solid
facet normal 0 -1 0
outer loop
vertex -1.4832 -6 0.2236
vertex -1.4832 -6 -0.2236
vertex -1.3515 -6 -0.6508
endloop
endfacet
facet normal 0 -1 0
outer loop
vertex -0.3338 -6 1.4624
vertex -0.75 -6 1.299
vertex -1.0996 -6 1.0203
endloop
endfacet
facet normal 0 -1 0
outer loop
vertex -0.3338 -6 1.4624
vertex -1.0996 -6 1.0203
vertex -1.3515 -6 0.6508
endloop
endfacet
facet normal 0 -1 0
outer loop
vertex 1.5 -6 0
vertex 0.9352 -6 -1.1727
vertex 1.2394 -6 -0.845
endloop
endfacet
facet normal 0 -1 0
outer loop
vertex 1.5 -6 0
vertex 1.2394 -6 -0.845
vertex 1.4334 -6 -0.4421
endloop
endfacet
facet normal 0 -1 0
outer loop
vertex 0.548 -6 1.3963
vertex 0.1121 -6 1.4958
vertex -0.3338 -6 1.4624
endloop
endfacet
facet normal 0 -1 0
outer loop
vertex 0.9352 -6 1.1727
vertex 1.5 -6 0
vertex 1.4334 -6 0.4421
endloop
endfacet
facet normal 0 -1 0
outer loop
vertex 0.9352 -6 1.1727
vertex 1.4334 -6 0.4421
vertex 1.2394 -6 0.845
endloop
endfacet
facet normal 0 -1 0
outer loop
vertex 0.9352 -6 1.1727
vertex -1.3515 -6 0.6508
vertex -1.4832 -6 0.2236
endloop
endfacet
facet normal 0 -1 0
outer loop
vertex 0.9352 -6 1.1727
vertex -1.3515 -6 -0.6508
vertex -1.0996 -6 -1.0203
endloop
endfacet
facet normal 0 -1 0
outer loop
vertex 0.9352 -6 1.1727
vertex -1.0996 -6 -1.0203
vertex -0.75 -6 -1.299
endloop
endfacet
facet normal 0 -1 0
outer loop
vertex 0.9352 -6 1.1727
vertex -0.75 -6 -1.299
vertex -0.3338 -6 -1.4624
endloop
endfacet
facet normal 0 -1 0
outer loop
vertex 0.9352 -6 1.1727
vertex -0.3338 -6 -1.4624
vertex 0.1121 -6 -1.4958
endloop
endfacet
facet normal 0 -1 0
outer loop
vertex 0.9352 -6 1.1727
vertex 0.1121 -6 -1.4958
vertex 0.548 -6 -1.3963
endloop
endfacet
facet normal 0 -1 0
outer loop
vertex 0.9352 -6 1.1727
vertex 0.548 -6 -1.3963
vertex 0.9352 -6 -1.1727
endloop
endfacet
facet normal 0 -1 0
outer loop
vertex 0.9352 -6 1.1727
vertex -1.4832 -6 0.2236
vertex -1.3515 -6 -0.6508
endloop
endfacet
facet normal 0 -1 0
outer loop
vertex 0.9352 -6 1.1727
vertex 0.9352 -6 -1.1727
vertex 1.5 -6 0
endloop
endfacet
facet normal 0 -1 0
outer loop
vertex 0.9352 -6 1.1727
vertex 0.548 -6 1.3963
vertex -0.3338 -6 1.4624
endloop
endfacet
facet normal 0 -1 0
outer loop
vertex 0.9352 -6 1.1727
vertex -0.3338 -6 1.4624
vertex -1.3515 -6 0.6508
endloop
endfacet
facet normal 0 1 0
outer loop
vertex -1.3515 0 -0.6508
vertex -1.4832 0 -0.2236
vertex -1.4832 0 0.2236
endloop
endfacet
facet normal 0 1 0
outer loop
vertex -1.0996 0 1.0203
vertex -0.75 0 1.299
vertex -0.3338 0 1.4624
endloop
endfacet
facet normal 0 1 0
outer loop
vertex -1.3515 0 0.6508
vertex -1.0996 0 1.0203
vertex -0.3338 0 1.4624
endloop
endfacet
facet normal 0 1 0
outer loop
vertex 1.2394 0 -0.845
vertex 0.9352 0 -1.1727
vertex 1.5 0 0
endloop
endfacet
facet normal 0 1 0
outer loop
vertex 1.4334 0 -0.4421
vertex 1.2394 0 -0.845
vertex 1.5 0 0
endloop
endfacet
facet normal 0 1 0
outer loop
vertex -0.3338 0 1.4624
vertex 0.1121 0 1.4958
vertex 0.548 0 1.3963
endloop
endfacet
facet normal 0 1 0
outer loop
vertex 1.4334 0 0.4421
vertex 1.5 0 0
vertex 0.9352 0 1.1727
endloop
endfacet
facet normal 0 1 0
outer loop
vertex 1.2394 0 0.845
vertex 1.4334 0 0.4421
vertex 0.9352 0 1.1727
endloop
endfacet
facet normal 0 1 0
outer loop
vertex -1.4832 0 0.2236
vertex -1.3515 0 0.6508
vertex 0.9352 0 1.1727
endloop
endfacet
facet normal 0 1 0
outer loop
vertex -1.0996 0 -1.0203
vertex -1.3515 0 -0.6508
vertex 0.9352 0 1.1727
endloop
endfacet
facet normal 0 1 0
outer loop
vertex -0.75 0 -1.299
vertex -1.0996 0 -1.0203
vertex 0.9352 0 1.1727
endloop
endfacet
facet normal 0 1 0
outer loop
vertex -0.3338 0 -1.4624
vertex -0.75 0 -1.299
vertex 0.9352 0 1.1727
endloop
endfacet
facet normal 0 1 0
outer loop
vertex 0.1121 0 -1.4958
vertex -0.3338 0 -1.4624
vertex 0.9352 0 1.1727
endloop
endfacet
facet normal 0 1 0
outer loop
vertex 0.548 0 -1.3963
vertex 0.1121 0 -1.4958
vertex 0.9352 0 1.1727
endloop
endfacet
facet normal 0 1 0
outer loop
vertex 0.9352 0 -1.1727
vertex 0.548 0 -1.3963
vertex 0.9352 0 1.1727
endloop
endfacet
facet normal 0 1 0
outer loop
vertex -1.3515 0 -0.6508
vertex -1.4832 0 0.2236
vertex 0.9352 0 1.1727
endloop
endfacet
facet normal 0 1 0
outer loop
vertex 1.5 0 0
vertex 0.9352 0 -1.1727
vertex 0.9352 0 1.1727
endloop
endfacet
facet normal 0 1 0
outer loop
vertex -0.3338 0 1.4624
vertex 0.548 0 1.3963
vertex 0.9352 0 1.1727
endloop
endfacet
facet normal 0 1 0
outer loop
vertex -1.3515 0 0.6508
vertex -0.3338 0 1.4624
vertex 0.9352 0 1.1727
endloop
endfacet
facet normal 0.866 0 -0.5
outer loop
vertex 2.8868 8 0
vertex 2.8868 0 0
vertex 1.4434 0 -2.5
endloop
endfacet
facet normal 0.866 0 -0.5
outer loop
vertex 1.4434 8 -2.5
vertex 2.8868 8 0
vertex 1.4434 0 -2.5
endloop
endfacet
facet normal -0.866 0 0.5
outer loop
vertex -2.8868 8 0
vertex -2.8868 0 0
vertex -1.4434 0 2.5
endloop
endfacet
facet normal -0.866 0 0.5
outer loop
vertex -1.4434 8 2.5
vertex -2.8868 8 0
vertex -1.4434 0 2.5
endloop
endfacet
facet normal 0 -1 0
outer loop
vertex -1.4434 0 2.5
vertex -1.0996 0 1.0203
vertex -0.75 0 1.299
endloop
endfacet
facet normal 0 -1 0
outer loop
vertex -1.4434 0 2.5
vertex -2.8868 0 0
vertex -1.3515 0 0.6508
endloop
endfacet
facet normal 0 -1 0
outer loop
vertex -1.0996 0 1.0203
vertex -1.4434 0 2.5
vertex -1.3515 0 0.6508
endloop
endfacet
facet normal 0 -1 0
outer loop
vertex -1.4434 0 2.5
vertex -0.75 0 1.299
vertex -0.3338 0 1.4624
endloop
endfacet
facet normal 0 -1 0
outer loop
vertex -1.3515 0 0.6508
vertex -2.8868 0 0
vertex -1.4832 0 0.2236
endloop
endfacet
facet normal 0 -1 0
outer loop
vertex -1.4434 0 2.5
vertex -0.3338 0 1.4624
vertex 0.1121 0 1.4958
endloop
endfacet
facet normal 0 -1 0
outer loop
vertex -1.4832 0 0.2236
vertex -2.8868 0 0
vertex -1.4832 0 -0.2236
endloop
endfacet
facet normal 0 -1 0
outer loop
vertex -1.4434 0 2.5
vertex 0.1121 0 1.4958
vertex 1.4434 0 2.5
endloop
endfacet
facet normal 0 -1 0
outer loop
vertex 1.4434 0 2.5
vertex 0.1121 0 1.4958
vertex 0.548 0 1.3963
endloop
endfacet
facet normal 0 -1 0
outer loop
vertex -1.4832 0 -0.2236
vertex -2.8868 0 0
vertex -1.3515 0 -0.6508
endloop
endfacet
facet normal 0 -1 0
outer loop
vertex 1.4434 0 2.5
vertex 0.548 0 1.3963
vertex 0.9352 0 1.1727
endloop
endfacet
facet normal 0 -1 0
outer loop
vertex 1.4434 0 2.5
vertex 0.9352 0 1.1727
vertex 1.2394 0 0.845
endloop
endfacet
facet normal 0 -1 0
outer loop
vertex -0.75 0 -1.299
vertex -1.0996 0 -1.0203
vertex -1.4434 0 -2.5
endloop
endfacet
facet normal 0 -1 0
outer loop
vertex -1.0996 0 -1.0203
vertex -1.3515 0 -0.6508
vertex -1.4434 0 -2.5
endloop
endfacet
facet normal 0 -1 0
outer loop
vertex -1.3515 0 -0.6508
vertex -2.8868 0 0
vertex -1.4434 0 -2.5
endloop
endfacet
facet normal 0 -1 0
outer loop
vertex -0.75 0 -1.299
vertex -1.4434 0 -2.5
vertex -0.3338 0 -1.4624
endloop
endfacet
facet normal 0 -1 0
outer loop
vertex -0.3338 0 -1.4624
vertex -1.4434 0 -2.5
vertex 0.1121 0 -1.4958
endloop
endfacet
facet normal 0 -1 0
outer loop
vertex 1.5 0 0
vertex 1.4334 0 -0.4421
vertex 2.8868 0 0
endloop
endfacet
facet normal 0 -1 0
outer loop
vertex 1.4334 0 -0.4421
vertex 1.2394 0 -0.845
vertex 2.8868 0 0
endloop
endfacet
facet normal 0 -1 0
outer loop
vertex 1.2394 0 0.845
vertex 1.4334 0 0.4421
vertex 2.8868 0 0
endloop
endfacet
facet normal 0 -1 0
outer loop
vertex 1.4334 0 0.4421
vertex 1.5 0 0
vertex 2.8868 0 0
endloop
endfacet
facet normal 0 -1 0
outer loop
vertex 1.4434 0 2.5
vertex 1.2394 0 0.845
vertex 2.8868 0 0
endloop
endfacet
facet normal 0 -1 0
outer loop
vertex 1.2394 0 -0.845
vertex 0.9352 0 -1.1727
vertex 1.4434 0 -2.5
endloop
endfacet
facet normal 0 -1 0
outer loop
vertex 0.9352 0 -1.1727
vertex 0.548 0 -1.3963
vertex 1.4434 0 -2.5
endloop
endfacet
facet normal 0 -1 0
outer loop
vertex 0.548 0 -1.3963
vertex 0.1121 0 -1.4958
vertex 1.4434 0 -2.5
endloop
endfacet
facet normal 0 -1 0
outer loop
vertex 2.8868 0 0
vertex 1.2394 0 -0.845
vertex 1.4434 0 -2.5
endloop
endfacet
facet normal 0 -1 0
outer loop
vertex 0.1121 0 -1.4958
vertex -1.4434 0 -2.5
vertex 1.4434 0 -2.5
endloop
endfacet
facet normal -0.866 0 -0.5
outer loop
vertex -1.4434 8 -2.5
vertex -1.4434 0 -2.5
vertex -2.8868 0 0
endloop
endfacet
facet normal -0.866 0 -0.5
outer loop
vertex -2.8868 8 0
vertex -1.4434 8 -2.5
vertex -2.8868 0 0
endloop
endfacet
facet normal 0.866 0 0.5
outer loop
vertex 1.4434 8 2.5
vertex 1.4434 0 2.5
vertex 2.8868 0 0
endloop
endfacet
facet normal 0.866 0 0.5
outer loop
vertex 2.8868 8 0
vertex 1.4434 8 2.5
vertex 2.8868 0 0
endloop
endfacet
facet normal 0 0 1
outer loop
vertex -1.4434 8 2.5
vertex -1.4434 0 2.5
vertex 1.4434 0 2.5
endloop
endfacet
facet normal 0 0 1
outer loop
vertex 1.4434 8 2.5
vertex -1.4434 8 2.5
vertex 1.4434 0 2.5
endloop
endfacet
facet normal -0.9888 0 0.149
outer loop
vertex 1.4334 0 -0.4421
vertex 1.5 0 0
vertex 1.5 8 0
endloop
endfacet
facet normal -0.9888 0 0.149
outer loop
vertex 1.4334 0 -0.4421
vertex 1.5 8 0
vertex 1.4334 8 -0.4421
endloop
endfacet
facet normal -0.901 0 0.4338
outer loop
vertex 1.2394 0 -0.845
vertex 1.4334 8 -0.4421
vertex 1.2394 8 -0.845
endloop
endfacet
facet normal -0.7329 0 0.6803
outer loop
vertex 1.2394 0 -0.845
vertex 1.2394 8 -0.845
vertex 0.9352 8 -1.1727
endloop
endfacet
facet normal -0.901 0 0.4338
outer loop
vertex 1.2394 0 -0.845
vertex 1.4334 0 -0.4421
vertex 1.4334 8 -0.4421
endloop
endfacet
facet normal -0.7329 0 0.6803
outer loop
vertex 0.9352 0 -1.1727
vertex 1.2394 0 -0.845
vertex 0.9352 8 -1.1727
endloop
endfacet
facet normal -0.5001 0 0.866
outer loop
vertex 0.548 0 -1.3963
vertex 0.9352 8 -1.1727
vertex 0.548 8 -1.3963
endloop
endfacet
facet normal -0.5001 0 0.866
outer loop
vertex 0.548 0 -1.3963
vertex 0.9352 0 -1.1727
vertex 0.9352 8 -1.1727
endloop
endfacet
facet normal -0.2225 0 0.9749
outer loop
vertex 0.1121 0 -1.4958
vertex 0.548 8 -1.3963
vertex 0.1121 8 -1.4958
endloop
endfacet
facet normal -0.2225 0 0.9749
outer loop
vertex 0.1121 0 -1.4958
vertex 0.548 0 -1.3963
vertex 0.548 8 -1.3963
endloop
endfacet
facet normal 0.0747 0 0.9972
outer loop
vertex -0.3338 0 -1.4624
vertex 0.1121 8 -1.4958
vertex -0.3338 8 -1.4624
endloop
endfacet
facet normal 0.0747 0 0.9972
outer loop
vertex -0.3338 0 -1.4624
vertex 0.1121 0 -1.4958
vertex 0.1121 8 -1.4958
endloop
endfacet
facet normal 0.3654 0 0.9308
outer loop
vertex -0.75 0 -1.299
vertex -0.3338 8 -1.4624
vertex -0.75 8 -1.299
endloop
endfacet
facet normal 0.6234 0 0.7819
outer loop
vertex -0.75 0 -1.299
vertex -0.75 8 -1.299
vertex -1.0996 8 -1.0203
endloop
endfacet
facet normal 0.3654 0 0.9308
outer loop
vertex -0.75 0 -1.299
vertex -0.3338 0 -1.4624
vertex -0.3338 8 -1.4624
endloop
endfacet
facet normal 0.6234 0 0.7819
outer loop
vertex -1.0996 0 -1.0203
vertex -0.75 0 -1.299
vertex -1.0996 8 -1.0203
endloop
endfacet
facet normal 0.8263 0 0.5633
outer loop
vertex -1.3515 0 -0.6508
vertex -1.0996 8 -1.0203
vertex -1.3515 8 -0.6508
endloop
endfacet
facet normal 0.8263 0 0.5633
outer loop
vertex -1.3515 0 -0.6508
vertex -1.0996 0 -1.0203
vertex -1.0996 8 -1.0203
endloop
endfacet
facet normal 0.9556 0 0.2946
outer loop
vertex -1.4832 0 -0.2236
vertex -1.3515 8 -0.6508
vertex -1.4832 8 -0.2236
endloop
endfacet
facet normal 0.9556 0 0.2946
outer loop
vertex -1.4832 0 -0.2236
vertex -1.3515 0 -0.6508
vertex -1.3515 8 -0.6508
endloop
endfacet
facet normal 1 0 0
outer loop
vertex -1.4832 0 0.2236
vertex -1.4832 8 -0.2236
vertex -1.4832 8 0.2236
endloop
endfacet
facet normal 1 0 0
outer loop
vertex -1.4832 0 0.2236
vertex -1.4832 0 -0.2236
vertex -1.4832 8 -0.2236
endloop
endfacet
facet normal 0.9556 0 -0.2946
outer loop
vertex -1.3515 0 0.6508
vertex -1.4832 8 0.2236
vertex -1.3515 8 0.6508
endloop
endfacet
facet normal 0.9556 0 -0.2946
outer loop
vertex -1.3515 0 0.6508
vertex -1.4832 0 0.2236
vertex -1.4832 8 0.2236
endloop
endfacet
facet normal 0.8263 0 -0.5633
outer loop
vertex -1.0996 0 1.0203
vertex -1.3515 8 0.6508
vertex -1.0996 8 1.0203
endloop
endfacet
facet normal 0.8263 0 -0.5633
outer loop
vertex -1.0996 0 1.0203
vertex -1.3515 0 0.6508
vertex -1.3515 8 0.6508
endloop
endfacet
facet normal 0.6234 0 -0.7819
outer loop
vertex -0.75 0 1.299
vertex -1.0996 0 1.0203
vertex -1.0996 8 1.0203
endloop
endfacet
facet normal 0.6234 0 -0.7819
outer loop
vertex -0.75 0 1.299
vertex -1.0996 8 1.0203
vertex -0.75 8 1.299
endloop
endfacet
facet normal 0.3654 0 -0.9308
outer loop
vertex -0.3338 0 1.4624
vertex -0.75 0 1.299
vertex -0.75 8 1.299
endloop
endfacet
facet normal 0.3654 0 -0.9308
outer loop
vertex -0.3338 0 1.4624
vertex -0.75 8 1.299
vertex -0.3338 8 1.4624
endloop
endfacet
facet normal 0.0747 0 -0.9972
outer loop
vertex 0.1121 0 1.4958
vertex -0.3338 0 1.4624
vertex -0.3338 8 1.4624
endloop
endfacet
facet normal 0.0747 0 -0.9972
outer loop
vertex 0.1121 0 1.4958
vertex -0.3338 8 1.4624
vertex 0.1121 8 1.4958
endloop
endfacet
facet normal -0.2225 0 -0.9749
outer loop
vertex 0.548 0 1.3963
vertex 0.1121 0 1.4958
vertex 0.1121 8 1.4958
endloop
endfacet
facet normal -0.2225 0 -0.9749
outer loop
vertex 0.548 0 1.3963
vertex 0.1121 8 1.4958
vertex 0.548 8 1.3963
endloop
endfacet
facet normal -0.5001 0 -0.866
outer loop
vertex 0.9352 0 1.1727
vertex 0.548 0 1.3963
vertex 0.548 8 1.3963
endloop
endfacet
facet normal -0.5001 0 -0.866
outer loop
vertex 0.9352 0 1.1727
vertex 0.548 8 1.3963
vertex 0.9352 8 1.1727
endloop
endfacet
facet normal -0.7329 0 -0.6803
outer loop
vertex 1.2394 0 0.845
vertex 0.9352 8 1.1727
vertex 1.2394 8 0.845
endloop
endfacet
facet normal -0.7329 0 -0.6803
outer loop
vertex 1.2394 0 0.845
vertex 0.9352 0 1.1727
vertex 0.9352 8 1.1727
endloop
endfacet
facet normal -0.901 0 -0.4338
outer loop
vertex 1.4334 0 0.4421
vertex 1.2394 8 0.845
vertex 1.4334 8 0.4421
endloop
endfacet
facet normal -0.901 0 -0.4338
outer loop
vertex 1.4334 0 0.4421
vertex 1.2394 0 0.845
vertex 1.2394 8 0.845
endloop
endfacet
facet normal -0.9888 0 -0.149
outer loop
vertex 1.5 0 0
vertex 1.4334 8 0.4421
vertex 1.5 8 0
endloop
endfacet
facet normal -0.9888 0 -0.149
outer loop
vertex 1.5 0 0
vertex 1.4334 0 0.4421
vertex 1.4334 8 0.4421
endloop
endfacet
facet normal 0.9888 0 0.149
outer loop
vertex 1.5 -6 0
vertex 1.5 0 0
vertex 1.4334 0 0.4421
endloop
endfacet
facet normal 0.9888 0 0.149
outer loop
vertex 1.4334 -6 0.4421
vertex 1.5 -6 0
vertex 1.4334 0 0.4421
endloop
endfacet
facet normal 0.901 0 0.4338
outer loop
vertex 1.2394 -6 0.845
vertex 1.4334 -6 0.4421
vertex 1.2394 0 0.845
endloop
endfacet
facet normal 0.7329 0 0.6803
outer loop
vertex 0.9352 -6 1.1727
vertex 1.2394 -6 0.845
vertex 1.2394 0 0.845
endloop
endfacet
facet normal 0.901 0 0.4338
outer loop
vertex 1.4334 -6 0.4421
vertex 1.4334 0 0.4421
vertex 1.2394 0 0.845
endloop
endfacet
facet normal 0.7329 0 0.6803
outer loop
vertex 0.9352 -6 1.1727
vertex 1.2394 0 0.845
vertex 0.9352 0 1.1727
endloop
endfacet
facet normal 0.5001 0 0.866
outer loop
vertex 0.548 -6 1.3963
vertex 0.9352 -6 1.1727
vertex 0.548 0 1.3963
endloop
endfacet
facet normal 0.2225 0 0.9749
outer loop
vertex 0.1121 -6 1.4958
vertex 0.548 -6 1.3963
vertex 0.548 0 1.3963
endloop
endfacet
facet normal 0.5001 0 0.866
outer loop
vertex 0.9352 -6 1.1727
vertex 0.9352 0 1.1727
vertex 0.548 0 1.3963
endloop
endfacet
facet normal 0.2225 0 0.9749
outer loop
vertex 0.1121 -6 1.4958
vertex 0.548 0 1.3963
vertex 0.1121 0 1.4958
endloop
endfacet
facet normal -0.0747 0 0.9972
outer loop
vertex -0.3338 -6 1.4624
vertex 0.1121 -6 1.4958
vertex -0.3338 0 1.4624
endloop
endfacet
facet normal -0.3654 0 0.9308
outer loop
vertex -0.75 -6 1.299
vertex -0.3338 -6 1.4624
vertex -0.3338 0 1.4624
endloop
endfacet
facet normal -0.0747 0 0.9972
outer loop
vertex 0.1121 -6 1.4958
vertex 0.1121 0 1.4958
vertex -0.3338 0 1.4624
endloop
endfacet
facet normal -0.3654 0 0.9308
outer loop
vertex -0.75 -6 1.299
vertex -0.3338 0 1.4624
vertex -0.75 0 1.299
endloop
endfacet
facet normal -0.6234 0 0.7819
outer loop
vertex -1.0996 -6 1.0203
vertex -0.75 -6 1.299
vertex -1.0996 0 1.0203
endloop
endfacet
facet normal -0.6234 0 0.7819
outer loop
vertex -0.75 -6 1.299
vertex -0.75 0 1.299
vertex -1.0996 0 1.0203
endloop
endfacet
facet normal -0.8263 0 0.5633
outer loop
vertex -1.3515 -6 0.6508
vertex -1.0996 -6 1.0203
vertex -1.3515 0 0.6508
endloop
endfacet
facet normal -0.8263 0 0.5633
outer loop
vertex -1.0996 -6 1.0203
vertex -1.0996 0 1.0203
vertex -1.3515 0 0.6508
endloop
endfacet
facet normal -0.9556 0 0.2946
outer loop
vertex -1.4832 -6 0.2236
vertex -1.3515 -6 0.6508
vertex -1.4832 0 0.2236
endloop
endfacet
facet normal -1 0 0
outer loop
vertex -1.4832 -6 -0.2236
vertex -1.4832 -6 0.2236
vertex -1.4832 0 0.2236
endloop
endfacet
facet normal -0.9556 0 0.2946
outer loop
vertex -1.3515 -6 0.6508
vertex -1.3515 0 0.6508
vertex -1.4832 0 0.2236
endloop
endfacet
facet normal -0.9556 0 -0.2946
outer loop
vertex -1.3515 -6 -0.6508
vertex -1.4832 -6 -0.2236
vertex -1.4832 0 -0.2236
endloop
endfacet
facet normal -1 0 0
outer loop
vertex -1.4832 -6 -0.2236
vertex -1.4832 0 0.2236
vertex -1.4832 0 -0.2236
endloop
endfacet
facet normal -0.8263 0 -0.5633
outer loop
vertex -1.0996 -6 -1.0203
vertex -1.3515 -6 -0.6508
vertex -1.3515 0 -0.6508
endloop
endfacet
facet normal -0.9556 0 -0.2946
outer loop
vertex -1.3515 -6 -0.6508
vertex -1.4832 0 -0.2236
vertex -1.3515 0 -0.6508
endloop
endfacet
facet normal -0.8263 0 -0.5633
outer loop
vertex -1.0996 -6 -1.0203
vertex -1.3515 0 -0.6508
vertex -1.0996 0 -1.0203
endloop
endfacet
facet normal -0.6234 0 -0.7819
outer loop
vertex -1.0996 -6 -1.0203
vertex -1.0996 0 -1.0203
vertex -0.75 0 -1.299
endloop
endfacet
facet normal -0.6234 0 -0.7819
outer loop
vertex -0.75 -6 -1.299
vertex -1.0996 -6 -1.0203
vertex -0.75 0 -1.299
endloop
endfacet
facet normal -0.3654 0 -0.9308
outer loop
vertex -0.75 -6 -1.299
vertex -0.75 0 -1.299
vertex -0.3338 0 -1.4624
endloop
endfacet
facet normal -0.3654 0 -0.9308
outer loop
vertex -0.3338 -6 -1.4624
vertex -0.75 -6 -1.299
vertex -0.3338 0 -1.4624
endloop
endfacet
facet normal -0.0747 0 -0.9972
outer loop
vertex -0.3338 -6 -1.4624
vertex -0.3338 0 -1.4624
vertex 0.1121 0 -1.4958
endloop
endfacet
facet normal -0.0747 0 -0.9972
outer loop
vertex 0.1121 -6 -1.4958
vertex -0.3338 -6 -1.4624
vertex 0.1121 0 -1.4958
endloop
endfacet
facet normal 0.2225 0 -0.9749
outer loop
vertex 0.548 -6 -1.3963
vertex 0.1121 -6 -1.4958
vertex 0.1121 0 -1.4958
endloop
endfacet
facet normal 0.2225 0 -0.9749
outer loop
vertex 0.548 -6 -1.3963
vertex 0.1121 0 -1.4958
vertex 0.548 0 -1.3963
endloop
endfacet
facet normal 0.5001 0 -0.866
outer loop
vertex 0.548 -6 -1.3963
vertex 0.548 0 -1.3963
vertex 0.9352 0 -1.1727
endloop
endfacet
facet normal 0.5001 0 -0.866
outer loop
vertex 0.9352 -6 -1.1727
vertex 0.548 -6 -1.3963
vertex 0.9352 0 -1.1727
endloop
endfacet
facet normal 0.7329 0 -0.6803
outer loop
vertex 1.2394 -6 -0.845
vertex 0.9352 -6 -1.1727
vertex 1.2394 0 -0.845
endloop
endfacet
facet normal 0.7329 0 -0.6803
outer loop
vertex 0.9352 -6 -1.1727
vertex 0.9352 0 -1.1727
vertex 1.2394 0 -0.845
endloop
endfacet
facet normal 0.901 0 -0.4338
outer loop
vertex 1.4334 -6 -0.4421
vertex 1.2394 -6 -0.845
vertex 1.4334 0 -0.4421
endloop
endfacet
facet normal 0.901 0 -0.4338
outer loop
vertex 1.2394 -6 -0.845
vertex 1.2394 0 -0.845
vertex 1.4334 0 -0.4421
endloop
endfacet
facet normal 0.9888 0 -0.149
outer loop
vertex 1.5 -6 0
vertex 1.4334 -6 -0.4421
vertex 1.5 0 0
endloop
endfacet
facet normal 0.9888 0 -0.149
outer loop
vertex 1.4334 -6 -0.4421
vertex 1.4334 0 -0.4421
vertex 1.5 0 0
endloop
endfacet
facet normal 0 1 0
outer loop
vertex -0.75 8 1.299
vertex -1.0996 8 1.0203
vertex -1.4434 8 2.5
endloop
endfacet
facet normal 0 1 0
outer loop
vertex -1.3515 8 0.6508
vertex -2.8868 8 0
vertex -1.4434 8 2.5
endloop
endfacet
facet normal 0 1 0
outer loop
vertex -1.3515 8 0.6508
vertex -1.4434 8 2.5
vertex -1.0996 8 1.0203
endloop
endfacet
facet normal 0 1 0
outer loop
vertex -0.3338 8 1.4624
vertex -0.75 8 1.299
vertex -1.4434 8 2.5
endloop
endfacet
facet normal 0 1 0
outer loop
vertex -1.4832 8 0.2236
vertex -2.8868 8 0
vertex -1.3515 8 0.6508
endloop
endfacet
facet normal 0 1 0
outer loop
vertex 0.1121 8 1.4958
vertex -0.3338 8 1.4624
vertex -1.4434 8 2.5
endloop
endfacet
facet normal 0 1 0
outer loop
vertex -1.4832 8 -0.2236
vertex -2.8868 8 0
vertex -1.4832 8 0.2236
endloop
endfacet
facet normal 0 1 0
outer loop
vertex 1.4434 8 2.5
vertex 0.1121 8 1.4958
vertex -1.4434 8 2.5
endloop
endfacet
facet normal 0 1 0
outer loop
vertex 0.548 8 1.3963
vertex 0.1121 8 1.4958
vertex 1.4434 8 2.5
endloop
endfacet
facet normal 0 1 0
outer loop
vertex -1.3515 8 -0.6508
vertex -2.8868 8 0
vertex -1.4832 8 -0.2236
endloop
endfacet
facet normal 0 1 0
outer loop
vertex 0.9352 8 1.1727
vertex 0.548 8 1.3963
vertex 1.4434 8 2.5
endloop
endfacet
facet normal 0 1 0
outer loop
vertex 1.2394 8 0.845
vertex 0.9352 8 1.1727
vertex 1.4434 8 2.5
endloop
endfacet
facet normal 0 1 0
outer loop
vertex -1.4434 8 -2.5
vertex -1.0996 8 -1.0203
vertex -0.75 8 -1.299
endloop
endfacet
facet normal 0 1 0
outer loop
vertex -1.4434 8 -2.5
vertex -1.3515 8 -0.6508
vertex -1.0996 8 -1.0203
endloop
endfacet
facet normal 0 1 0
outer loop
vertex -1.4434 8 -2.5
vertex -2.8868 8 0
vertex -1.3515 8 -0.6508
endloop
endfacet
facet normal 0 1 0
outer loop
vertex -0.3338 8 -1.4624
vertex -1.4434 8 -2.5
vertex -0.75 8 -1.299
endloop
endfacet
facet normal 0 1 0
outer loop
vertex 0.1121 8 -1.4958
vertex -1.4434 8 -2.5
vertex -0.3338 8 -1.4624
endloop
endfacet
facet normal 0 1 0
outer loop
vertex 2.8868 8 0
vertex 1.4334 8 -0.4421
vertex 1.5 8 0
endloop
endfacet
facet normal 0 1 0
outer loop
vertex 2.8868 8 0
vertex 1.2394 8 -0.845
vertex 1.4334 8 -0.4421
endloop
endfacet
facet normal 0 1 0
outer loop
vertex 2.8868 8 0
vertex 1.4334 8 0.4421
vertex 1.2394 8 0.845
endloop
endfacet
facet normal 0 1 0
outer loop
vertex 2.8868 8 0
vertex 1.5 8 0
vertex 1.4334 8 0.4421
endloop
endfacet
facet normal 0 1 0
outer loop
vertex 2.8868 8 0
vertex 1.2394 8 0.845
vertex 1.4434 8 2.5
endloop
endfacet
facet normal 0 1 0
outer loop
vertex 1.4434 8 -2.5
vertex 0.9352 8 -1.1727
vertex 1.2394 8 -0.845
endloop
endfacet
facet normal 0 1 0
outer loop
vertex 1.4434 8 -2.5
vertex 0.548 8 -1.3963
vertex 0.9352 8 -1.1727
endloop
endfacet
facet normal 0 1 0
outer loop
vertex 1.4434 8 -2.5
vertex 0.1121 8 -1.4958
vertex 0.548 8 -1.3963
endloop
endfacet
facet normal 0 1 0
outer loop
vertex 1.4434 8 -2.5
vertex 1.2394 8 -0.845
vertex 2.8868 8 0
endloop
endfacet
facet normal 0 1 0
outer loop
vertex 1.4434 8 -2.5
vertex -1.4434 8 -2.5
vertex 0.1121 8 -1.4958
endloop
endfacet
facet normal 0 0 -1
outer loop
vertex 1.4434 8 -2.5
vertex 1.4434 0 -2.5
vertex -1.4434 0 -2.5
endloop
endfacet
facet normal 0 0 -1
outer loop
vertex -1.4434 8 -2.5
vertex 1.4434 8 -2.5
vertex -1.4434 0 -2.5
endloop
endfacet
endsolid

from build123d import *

# Parameters (mm, degrees)
CROQUIS1_R              = 1.5
SALIENTE_EXTRUIR1_DEPTH = 8
CROQUIS2_R              = 1.5
SALIENTE_EXTRUIR2_DEPTH = 6


with BuildPart() as part:
    # Croquis1 → Saliente-Extruir1 (new body)
    with BuildSketch(Plane(origin=(0, 0, 0), x_dir=(1, 0, 0), z_dir=(0, 1, 0))):
        Polygon((1.443375673, -2.5), (2.886751346, 0), (1.443375673, 2.5), (-1.443375673, 2.5), (-2.886751346, 0), (-1.443375673, -2.5), align=None)
        Circle(CROQUIS1_R, mode=Mode.SUBTRACT)
    extrude(amount=SALIENTE_EXTRUIR1_DEPTH)


with BuildPart() as body_2:
    # Croquis2 → Saliente-Extruir2 (new body)
    with BuildSketch(Plane.XZ):
        Circle(CROQUIS2_R)
    extrude(amount=SALIENTE_EXTRUIR2_DEPTH)


solid = Compound([part.part, body_2.part])
